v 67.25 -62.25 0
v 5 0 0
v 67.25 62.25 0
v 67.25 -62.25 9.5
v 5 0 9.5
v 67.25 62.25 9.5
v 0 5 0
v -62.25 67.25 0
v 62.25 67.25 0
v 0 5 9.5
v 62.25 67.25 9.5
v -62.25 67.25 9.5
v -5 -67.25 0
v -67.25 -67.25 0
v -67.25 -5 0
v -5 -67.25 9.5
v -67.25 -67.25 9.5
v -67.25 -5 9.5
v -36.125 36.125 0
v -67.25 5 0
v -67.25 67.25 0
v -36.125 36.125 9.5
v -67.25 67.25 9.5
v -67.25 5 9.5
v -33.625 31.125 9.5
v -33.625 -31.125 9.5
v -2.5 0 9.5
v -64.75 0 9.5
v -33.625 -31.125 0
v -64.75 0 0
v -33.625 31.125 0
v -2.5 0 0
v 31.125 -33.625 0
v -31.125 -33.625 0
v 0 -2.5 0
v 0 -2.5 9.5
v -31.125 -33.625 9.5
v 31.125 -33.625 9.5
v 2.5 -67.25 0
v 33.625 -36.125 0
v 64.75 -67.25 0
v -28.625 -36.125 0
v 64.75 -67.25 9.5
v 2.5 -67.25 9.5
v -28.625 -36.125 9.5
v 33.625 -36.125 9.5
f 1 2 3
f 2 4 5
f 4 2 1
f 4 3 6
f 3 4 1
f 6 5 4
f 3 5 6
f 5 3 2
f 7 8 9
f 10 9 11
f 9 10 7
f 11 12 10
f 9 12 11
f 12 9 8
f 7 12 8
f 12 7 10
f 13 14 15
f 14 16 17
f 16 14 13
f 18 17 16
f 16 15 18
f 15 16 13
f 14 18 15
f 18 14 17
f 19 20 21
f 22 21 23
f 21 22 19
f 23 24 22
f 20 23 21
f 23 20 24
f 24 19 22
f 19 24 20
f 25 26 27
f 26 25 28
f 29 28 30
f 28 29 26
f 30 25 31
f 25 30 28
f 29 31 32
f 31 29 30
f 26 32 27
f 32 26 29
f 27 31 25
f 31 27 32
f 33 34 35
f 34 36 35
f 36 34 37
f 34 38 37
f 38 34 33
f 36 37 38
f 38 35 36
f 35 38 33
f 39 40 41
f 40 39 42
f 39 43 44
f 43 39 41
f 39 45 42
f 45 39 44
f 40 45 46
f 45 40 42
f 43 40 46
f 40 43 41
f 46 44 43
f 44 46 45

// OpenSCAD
epsilon = 0.01;
module rounded_box(length, width, height, outer_r) {
    // A simple solid box with rounded bottom and side edges.
    // Essentially this is a box with spherical corners and cylindrical
    // edges on the outside.  You can then subtract whatever object you want
    // from it to make it hollow if you like.
    // Parameters are: the external length, width and height,
    // the radius of the corners and edges.
    outer_d = outer_r*2;
    translate([outer_r, outer_r, outer_r]) difference() {
        // outer rounded rectangle
        minkowski() {
            cube([length-outer_d, width-outer_d, height-outer_r]);
            sphere(r=outer_r);
        };
        // top face
        translate([-outer_r, -outer_r, height-outer_r+epsilon]) 
          cube([length+2*outer_r, width+2*outer_r, outer_r]);
    }
}

module v_cut(x1, y1, x2, y2, depth) {
    // A 'v' cut, going down into -Z, of depth 'depth' and width 'depth*2',
    // starting from [x1, y1] and going to [x2, y2].  This is described as
    // a linear_extrude of a triangle, and then rotated and translated into
    // position.  The 'cut' is into the XY plane.
    dx = x2 - x1; dy = y2 - y1;
    cut_len = sqrt(dx*dx + dy*dy); cut_angle = atan2(dy, dx);
    translate([x1, y1, 0]) rotate([0, 90, cut_angle]) linear_extrude(cut_len) polygon([
        [0, depth], [depth, 0], [0, -depth] 
    ]);
}

total_tangram_side = 124.5;
tri_a_side = total_tangram_side / sqrt(2);
tri_b_side = total_tangram_side / 2;
tri_c_side = tri_a_side / 2;
tangram_height = 9.5;

enclosure_wall = 3;
enclosure_side = total_tangram_side + 3*2;
enclosure_floor = 2.5;
enclosure_height = tangram_height + enclosure_floor;

v_cut_depth = 1; v_cut_off = 1; v_cut_2 = v_cut_off*2;

// small triangle
module small_triangle() linear_extrude(tangram_height) polygon([
    [0, 0], [tri_c_side, 0], [0, tri_c_side]
]);

// medium triangle
module medium_triangle() linear_extrude(tangram_height) polygon([
    [0, 0], [tri_b_side, 0], [0, tri_b_side]
]);

// large triangle
module large_triangle() linear_extrude(tangram_height) polygon([
    [0, 0], [tri_a_side, 0], [0, tri_a_side]
]);

// square
module tan_square() cube([tri_c_side, tri_c_side, tangram_height]);

// parallelogram
module parallelogram() linear_extrude(tangram_height) polygon([
    [0, 0], [tri_c_side, 0], [tri_a_side, tri_c_side], [tri_c_side, tri_c_side]
]);

color("white") translate([5, 0, 0]) rotate([0, 0, -45]) large_triangle();
color("black") translate([0, 5, 0]) rotate([0, 0, +45]) large_triangle();
color("red") translate([-tri_b_side-5, -tri_b_side-5, 0]) rotate([0, 0, 0]) medium_triangle();
color("yellow") translate([-tri_b_side/2-5, tri_b_side/2+5, 0]) rotate([0, 0, +135]) small_triangle();
color("green") translate([-tri_b_side/2-2.5, -tri_b_side/2, 0]) rotate([0, 0, +45]) tan_square();
color("blue") translate([0, -2.5, 0]) rotate([0, 0, +225]) small_triangle();
color("purple") translate([-tri_b_side/2+2.5, -tri_b_side/2-5, 0]) rotate([0, 0, -45]) parallelogram();

* difference() {
    rounded_box(enclosure_side, enclosure_side, enclosure_height, 2);
    translate([enclosure_wall, enclosure_wall, enclosure_floor]) union() {
        cube([total_tangram_side, total_tangram_side, tangram_height+1]);
        translate([v_cut_off, v_cut_off, 0.1]) union() {
            v_cut(0, 0, total_tangram_side-v_cut_2, total_tangram_side-v_cut_2, v_cut_depth);
            v_cut(tri_b_side, tri_b_side, total_tangram_side-v_cut_2, 0, v_cut_depth);
            v_cut(0, tri_b_side, tri_b_side, total_tangram_side-v_cut_2, v_cut_depth);
            v_cut(tri_b_side/2, tri_b_side/2, tri_b_side/2, tri_b_side*1.5-v_cut_off, v_cut_depth);
            v_cut(tri_b_side, tri_b_side, tri_b_side/2, tri_b_side*1.5-v_cut_off, v_cut_depth);
            v_cut(tri_b_side*1.5, tri_b_side*1.5, tri_b_side, total_tangram_side-v_cut_2, v_cut_depth);
        }
    }
}
